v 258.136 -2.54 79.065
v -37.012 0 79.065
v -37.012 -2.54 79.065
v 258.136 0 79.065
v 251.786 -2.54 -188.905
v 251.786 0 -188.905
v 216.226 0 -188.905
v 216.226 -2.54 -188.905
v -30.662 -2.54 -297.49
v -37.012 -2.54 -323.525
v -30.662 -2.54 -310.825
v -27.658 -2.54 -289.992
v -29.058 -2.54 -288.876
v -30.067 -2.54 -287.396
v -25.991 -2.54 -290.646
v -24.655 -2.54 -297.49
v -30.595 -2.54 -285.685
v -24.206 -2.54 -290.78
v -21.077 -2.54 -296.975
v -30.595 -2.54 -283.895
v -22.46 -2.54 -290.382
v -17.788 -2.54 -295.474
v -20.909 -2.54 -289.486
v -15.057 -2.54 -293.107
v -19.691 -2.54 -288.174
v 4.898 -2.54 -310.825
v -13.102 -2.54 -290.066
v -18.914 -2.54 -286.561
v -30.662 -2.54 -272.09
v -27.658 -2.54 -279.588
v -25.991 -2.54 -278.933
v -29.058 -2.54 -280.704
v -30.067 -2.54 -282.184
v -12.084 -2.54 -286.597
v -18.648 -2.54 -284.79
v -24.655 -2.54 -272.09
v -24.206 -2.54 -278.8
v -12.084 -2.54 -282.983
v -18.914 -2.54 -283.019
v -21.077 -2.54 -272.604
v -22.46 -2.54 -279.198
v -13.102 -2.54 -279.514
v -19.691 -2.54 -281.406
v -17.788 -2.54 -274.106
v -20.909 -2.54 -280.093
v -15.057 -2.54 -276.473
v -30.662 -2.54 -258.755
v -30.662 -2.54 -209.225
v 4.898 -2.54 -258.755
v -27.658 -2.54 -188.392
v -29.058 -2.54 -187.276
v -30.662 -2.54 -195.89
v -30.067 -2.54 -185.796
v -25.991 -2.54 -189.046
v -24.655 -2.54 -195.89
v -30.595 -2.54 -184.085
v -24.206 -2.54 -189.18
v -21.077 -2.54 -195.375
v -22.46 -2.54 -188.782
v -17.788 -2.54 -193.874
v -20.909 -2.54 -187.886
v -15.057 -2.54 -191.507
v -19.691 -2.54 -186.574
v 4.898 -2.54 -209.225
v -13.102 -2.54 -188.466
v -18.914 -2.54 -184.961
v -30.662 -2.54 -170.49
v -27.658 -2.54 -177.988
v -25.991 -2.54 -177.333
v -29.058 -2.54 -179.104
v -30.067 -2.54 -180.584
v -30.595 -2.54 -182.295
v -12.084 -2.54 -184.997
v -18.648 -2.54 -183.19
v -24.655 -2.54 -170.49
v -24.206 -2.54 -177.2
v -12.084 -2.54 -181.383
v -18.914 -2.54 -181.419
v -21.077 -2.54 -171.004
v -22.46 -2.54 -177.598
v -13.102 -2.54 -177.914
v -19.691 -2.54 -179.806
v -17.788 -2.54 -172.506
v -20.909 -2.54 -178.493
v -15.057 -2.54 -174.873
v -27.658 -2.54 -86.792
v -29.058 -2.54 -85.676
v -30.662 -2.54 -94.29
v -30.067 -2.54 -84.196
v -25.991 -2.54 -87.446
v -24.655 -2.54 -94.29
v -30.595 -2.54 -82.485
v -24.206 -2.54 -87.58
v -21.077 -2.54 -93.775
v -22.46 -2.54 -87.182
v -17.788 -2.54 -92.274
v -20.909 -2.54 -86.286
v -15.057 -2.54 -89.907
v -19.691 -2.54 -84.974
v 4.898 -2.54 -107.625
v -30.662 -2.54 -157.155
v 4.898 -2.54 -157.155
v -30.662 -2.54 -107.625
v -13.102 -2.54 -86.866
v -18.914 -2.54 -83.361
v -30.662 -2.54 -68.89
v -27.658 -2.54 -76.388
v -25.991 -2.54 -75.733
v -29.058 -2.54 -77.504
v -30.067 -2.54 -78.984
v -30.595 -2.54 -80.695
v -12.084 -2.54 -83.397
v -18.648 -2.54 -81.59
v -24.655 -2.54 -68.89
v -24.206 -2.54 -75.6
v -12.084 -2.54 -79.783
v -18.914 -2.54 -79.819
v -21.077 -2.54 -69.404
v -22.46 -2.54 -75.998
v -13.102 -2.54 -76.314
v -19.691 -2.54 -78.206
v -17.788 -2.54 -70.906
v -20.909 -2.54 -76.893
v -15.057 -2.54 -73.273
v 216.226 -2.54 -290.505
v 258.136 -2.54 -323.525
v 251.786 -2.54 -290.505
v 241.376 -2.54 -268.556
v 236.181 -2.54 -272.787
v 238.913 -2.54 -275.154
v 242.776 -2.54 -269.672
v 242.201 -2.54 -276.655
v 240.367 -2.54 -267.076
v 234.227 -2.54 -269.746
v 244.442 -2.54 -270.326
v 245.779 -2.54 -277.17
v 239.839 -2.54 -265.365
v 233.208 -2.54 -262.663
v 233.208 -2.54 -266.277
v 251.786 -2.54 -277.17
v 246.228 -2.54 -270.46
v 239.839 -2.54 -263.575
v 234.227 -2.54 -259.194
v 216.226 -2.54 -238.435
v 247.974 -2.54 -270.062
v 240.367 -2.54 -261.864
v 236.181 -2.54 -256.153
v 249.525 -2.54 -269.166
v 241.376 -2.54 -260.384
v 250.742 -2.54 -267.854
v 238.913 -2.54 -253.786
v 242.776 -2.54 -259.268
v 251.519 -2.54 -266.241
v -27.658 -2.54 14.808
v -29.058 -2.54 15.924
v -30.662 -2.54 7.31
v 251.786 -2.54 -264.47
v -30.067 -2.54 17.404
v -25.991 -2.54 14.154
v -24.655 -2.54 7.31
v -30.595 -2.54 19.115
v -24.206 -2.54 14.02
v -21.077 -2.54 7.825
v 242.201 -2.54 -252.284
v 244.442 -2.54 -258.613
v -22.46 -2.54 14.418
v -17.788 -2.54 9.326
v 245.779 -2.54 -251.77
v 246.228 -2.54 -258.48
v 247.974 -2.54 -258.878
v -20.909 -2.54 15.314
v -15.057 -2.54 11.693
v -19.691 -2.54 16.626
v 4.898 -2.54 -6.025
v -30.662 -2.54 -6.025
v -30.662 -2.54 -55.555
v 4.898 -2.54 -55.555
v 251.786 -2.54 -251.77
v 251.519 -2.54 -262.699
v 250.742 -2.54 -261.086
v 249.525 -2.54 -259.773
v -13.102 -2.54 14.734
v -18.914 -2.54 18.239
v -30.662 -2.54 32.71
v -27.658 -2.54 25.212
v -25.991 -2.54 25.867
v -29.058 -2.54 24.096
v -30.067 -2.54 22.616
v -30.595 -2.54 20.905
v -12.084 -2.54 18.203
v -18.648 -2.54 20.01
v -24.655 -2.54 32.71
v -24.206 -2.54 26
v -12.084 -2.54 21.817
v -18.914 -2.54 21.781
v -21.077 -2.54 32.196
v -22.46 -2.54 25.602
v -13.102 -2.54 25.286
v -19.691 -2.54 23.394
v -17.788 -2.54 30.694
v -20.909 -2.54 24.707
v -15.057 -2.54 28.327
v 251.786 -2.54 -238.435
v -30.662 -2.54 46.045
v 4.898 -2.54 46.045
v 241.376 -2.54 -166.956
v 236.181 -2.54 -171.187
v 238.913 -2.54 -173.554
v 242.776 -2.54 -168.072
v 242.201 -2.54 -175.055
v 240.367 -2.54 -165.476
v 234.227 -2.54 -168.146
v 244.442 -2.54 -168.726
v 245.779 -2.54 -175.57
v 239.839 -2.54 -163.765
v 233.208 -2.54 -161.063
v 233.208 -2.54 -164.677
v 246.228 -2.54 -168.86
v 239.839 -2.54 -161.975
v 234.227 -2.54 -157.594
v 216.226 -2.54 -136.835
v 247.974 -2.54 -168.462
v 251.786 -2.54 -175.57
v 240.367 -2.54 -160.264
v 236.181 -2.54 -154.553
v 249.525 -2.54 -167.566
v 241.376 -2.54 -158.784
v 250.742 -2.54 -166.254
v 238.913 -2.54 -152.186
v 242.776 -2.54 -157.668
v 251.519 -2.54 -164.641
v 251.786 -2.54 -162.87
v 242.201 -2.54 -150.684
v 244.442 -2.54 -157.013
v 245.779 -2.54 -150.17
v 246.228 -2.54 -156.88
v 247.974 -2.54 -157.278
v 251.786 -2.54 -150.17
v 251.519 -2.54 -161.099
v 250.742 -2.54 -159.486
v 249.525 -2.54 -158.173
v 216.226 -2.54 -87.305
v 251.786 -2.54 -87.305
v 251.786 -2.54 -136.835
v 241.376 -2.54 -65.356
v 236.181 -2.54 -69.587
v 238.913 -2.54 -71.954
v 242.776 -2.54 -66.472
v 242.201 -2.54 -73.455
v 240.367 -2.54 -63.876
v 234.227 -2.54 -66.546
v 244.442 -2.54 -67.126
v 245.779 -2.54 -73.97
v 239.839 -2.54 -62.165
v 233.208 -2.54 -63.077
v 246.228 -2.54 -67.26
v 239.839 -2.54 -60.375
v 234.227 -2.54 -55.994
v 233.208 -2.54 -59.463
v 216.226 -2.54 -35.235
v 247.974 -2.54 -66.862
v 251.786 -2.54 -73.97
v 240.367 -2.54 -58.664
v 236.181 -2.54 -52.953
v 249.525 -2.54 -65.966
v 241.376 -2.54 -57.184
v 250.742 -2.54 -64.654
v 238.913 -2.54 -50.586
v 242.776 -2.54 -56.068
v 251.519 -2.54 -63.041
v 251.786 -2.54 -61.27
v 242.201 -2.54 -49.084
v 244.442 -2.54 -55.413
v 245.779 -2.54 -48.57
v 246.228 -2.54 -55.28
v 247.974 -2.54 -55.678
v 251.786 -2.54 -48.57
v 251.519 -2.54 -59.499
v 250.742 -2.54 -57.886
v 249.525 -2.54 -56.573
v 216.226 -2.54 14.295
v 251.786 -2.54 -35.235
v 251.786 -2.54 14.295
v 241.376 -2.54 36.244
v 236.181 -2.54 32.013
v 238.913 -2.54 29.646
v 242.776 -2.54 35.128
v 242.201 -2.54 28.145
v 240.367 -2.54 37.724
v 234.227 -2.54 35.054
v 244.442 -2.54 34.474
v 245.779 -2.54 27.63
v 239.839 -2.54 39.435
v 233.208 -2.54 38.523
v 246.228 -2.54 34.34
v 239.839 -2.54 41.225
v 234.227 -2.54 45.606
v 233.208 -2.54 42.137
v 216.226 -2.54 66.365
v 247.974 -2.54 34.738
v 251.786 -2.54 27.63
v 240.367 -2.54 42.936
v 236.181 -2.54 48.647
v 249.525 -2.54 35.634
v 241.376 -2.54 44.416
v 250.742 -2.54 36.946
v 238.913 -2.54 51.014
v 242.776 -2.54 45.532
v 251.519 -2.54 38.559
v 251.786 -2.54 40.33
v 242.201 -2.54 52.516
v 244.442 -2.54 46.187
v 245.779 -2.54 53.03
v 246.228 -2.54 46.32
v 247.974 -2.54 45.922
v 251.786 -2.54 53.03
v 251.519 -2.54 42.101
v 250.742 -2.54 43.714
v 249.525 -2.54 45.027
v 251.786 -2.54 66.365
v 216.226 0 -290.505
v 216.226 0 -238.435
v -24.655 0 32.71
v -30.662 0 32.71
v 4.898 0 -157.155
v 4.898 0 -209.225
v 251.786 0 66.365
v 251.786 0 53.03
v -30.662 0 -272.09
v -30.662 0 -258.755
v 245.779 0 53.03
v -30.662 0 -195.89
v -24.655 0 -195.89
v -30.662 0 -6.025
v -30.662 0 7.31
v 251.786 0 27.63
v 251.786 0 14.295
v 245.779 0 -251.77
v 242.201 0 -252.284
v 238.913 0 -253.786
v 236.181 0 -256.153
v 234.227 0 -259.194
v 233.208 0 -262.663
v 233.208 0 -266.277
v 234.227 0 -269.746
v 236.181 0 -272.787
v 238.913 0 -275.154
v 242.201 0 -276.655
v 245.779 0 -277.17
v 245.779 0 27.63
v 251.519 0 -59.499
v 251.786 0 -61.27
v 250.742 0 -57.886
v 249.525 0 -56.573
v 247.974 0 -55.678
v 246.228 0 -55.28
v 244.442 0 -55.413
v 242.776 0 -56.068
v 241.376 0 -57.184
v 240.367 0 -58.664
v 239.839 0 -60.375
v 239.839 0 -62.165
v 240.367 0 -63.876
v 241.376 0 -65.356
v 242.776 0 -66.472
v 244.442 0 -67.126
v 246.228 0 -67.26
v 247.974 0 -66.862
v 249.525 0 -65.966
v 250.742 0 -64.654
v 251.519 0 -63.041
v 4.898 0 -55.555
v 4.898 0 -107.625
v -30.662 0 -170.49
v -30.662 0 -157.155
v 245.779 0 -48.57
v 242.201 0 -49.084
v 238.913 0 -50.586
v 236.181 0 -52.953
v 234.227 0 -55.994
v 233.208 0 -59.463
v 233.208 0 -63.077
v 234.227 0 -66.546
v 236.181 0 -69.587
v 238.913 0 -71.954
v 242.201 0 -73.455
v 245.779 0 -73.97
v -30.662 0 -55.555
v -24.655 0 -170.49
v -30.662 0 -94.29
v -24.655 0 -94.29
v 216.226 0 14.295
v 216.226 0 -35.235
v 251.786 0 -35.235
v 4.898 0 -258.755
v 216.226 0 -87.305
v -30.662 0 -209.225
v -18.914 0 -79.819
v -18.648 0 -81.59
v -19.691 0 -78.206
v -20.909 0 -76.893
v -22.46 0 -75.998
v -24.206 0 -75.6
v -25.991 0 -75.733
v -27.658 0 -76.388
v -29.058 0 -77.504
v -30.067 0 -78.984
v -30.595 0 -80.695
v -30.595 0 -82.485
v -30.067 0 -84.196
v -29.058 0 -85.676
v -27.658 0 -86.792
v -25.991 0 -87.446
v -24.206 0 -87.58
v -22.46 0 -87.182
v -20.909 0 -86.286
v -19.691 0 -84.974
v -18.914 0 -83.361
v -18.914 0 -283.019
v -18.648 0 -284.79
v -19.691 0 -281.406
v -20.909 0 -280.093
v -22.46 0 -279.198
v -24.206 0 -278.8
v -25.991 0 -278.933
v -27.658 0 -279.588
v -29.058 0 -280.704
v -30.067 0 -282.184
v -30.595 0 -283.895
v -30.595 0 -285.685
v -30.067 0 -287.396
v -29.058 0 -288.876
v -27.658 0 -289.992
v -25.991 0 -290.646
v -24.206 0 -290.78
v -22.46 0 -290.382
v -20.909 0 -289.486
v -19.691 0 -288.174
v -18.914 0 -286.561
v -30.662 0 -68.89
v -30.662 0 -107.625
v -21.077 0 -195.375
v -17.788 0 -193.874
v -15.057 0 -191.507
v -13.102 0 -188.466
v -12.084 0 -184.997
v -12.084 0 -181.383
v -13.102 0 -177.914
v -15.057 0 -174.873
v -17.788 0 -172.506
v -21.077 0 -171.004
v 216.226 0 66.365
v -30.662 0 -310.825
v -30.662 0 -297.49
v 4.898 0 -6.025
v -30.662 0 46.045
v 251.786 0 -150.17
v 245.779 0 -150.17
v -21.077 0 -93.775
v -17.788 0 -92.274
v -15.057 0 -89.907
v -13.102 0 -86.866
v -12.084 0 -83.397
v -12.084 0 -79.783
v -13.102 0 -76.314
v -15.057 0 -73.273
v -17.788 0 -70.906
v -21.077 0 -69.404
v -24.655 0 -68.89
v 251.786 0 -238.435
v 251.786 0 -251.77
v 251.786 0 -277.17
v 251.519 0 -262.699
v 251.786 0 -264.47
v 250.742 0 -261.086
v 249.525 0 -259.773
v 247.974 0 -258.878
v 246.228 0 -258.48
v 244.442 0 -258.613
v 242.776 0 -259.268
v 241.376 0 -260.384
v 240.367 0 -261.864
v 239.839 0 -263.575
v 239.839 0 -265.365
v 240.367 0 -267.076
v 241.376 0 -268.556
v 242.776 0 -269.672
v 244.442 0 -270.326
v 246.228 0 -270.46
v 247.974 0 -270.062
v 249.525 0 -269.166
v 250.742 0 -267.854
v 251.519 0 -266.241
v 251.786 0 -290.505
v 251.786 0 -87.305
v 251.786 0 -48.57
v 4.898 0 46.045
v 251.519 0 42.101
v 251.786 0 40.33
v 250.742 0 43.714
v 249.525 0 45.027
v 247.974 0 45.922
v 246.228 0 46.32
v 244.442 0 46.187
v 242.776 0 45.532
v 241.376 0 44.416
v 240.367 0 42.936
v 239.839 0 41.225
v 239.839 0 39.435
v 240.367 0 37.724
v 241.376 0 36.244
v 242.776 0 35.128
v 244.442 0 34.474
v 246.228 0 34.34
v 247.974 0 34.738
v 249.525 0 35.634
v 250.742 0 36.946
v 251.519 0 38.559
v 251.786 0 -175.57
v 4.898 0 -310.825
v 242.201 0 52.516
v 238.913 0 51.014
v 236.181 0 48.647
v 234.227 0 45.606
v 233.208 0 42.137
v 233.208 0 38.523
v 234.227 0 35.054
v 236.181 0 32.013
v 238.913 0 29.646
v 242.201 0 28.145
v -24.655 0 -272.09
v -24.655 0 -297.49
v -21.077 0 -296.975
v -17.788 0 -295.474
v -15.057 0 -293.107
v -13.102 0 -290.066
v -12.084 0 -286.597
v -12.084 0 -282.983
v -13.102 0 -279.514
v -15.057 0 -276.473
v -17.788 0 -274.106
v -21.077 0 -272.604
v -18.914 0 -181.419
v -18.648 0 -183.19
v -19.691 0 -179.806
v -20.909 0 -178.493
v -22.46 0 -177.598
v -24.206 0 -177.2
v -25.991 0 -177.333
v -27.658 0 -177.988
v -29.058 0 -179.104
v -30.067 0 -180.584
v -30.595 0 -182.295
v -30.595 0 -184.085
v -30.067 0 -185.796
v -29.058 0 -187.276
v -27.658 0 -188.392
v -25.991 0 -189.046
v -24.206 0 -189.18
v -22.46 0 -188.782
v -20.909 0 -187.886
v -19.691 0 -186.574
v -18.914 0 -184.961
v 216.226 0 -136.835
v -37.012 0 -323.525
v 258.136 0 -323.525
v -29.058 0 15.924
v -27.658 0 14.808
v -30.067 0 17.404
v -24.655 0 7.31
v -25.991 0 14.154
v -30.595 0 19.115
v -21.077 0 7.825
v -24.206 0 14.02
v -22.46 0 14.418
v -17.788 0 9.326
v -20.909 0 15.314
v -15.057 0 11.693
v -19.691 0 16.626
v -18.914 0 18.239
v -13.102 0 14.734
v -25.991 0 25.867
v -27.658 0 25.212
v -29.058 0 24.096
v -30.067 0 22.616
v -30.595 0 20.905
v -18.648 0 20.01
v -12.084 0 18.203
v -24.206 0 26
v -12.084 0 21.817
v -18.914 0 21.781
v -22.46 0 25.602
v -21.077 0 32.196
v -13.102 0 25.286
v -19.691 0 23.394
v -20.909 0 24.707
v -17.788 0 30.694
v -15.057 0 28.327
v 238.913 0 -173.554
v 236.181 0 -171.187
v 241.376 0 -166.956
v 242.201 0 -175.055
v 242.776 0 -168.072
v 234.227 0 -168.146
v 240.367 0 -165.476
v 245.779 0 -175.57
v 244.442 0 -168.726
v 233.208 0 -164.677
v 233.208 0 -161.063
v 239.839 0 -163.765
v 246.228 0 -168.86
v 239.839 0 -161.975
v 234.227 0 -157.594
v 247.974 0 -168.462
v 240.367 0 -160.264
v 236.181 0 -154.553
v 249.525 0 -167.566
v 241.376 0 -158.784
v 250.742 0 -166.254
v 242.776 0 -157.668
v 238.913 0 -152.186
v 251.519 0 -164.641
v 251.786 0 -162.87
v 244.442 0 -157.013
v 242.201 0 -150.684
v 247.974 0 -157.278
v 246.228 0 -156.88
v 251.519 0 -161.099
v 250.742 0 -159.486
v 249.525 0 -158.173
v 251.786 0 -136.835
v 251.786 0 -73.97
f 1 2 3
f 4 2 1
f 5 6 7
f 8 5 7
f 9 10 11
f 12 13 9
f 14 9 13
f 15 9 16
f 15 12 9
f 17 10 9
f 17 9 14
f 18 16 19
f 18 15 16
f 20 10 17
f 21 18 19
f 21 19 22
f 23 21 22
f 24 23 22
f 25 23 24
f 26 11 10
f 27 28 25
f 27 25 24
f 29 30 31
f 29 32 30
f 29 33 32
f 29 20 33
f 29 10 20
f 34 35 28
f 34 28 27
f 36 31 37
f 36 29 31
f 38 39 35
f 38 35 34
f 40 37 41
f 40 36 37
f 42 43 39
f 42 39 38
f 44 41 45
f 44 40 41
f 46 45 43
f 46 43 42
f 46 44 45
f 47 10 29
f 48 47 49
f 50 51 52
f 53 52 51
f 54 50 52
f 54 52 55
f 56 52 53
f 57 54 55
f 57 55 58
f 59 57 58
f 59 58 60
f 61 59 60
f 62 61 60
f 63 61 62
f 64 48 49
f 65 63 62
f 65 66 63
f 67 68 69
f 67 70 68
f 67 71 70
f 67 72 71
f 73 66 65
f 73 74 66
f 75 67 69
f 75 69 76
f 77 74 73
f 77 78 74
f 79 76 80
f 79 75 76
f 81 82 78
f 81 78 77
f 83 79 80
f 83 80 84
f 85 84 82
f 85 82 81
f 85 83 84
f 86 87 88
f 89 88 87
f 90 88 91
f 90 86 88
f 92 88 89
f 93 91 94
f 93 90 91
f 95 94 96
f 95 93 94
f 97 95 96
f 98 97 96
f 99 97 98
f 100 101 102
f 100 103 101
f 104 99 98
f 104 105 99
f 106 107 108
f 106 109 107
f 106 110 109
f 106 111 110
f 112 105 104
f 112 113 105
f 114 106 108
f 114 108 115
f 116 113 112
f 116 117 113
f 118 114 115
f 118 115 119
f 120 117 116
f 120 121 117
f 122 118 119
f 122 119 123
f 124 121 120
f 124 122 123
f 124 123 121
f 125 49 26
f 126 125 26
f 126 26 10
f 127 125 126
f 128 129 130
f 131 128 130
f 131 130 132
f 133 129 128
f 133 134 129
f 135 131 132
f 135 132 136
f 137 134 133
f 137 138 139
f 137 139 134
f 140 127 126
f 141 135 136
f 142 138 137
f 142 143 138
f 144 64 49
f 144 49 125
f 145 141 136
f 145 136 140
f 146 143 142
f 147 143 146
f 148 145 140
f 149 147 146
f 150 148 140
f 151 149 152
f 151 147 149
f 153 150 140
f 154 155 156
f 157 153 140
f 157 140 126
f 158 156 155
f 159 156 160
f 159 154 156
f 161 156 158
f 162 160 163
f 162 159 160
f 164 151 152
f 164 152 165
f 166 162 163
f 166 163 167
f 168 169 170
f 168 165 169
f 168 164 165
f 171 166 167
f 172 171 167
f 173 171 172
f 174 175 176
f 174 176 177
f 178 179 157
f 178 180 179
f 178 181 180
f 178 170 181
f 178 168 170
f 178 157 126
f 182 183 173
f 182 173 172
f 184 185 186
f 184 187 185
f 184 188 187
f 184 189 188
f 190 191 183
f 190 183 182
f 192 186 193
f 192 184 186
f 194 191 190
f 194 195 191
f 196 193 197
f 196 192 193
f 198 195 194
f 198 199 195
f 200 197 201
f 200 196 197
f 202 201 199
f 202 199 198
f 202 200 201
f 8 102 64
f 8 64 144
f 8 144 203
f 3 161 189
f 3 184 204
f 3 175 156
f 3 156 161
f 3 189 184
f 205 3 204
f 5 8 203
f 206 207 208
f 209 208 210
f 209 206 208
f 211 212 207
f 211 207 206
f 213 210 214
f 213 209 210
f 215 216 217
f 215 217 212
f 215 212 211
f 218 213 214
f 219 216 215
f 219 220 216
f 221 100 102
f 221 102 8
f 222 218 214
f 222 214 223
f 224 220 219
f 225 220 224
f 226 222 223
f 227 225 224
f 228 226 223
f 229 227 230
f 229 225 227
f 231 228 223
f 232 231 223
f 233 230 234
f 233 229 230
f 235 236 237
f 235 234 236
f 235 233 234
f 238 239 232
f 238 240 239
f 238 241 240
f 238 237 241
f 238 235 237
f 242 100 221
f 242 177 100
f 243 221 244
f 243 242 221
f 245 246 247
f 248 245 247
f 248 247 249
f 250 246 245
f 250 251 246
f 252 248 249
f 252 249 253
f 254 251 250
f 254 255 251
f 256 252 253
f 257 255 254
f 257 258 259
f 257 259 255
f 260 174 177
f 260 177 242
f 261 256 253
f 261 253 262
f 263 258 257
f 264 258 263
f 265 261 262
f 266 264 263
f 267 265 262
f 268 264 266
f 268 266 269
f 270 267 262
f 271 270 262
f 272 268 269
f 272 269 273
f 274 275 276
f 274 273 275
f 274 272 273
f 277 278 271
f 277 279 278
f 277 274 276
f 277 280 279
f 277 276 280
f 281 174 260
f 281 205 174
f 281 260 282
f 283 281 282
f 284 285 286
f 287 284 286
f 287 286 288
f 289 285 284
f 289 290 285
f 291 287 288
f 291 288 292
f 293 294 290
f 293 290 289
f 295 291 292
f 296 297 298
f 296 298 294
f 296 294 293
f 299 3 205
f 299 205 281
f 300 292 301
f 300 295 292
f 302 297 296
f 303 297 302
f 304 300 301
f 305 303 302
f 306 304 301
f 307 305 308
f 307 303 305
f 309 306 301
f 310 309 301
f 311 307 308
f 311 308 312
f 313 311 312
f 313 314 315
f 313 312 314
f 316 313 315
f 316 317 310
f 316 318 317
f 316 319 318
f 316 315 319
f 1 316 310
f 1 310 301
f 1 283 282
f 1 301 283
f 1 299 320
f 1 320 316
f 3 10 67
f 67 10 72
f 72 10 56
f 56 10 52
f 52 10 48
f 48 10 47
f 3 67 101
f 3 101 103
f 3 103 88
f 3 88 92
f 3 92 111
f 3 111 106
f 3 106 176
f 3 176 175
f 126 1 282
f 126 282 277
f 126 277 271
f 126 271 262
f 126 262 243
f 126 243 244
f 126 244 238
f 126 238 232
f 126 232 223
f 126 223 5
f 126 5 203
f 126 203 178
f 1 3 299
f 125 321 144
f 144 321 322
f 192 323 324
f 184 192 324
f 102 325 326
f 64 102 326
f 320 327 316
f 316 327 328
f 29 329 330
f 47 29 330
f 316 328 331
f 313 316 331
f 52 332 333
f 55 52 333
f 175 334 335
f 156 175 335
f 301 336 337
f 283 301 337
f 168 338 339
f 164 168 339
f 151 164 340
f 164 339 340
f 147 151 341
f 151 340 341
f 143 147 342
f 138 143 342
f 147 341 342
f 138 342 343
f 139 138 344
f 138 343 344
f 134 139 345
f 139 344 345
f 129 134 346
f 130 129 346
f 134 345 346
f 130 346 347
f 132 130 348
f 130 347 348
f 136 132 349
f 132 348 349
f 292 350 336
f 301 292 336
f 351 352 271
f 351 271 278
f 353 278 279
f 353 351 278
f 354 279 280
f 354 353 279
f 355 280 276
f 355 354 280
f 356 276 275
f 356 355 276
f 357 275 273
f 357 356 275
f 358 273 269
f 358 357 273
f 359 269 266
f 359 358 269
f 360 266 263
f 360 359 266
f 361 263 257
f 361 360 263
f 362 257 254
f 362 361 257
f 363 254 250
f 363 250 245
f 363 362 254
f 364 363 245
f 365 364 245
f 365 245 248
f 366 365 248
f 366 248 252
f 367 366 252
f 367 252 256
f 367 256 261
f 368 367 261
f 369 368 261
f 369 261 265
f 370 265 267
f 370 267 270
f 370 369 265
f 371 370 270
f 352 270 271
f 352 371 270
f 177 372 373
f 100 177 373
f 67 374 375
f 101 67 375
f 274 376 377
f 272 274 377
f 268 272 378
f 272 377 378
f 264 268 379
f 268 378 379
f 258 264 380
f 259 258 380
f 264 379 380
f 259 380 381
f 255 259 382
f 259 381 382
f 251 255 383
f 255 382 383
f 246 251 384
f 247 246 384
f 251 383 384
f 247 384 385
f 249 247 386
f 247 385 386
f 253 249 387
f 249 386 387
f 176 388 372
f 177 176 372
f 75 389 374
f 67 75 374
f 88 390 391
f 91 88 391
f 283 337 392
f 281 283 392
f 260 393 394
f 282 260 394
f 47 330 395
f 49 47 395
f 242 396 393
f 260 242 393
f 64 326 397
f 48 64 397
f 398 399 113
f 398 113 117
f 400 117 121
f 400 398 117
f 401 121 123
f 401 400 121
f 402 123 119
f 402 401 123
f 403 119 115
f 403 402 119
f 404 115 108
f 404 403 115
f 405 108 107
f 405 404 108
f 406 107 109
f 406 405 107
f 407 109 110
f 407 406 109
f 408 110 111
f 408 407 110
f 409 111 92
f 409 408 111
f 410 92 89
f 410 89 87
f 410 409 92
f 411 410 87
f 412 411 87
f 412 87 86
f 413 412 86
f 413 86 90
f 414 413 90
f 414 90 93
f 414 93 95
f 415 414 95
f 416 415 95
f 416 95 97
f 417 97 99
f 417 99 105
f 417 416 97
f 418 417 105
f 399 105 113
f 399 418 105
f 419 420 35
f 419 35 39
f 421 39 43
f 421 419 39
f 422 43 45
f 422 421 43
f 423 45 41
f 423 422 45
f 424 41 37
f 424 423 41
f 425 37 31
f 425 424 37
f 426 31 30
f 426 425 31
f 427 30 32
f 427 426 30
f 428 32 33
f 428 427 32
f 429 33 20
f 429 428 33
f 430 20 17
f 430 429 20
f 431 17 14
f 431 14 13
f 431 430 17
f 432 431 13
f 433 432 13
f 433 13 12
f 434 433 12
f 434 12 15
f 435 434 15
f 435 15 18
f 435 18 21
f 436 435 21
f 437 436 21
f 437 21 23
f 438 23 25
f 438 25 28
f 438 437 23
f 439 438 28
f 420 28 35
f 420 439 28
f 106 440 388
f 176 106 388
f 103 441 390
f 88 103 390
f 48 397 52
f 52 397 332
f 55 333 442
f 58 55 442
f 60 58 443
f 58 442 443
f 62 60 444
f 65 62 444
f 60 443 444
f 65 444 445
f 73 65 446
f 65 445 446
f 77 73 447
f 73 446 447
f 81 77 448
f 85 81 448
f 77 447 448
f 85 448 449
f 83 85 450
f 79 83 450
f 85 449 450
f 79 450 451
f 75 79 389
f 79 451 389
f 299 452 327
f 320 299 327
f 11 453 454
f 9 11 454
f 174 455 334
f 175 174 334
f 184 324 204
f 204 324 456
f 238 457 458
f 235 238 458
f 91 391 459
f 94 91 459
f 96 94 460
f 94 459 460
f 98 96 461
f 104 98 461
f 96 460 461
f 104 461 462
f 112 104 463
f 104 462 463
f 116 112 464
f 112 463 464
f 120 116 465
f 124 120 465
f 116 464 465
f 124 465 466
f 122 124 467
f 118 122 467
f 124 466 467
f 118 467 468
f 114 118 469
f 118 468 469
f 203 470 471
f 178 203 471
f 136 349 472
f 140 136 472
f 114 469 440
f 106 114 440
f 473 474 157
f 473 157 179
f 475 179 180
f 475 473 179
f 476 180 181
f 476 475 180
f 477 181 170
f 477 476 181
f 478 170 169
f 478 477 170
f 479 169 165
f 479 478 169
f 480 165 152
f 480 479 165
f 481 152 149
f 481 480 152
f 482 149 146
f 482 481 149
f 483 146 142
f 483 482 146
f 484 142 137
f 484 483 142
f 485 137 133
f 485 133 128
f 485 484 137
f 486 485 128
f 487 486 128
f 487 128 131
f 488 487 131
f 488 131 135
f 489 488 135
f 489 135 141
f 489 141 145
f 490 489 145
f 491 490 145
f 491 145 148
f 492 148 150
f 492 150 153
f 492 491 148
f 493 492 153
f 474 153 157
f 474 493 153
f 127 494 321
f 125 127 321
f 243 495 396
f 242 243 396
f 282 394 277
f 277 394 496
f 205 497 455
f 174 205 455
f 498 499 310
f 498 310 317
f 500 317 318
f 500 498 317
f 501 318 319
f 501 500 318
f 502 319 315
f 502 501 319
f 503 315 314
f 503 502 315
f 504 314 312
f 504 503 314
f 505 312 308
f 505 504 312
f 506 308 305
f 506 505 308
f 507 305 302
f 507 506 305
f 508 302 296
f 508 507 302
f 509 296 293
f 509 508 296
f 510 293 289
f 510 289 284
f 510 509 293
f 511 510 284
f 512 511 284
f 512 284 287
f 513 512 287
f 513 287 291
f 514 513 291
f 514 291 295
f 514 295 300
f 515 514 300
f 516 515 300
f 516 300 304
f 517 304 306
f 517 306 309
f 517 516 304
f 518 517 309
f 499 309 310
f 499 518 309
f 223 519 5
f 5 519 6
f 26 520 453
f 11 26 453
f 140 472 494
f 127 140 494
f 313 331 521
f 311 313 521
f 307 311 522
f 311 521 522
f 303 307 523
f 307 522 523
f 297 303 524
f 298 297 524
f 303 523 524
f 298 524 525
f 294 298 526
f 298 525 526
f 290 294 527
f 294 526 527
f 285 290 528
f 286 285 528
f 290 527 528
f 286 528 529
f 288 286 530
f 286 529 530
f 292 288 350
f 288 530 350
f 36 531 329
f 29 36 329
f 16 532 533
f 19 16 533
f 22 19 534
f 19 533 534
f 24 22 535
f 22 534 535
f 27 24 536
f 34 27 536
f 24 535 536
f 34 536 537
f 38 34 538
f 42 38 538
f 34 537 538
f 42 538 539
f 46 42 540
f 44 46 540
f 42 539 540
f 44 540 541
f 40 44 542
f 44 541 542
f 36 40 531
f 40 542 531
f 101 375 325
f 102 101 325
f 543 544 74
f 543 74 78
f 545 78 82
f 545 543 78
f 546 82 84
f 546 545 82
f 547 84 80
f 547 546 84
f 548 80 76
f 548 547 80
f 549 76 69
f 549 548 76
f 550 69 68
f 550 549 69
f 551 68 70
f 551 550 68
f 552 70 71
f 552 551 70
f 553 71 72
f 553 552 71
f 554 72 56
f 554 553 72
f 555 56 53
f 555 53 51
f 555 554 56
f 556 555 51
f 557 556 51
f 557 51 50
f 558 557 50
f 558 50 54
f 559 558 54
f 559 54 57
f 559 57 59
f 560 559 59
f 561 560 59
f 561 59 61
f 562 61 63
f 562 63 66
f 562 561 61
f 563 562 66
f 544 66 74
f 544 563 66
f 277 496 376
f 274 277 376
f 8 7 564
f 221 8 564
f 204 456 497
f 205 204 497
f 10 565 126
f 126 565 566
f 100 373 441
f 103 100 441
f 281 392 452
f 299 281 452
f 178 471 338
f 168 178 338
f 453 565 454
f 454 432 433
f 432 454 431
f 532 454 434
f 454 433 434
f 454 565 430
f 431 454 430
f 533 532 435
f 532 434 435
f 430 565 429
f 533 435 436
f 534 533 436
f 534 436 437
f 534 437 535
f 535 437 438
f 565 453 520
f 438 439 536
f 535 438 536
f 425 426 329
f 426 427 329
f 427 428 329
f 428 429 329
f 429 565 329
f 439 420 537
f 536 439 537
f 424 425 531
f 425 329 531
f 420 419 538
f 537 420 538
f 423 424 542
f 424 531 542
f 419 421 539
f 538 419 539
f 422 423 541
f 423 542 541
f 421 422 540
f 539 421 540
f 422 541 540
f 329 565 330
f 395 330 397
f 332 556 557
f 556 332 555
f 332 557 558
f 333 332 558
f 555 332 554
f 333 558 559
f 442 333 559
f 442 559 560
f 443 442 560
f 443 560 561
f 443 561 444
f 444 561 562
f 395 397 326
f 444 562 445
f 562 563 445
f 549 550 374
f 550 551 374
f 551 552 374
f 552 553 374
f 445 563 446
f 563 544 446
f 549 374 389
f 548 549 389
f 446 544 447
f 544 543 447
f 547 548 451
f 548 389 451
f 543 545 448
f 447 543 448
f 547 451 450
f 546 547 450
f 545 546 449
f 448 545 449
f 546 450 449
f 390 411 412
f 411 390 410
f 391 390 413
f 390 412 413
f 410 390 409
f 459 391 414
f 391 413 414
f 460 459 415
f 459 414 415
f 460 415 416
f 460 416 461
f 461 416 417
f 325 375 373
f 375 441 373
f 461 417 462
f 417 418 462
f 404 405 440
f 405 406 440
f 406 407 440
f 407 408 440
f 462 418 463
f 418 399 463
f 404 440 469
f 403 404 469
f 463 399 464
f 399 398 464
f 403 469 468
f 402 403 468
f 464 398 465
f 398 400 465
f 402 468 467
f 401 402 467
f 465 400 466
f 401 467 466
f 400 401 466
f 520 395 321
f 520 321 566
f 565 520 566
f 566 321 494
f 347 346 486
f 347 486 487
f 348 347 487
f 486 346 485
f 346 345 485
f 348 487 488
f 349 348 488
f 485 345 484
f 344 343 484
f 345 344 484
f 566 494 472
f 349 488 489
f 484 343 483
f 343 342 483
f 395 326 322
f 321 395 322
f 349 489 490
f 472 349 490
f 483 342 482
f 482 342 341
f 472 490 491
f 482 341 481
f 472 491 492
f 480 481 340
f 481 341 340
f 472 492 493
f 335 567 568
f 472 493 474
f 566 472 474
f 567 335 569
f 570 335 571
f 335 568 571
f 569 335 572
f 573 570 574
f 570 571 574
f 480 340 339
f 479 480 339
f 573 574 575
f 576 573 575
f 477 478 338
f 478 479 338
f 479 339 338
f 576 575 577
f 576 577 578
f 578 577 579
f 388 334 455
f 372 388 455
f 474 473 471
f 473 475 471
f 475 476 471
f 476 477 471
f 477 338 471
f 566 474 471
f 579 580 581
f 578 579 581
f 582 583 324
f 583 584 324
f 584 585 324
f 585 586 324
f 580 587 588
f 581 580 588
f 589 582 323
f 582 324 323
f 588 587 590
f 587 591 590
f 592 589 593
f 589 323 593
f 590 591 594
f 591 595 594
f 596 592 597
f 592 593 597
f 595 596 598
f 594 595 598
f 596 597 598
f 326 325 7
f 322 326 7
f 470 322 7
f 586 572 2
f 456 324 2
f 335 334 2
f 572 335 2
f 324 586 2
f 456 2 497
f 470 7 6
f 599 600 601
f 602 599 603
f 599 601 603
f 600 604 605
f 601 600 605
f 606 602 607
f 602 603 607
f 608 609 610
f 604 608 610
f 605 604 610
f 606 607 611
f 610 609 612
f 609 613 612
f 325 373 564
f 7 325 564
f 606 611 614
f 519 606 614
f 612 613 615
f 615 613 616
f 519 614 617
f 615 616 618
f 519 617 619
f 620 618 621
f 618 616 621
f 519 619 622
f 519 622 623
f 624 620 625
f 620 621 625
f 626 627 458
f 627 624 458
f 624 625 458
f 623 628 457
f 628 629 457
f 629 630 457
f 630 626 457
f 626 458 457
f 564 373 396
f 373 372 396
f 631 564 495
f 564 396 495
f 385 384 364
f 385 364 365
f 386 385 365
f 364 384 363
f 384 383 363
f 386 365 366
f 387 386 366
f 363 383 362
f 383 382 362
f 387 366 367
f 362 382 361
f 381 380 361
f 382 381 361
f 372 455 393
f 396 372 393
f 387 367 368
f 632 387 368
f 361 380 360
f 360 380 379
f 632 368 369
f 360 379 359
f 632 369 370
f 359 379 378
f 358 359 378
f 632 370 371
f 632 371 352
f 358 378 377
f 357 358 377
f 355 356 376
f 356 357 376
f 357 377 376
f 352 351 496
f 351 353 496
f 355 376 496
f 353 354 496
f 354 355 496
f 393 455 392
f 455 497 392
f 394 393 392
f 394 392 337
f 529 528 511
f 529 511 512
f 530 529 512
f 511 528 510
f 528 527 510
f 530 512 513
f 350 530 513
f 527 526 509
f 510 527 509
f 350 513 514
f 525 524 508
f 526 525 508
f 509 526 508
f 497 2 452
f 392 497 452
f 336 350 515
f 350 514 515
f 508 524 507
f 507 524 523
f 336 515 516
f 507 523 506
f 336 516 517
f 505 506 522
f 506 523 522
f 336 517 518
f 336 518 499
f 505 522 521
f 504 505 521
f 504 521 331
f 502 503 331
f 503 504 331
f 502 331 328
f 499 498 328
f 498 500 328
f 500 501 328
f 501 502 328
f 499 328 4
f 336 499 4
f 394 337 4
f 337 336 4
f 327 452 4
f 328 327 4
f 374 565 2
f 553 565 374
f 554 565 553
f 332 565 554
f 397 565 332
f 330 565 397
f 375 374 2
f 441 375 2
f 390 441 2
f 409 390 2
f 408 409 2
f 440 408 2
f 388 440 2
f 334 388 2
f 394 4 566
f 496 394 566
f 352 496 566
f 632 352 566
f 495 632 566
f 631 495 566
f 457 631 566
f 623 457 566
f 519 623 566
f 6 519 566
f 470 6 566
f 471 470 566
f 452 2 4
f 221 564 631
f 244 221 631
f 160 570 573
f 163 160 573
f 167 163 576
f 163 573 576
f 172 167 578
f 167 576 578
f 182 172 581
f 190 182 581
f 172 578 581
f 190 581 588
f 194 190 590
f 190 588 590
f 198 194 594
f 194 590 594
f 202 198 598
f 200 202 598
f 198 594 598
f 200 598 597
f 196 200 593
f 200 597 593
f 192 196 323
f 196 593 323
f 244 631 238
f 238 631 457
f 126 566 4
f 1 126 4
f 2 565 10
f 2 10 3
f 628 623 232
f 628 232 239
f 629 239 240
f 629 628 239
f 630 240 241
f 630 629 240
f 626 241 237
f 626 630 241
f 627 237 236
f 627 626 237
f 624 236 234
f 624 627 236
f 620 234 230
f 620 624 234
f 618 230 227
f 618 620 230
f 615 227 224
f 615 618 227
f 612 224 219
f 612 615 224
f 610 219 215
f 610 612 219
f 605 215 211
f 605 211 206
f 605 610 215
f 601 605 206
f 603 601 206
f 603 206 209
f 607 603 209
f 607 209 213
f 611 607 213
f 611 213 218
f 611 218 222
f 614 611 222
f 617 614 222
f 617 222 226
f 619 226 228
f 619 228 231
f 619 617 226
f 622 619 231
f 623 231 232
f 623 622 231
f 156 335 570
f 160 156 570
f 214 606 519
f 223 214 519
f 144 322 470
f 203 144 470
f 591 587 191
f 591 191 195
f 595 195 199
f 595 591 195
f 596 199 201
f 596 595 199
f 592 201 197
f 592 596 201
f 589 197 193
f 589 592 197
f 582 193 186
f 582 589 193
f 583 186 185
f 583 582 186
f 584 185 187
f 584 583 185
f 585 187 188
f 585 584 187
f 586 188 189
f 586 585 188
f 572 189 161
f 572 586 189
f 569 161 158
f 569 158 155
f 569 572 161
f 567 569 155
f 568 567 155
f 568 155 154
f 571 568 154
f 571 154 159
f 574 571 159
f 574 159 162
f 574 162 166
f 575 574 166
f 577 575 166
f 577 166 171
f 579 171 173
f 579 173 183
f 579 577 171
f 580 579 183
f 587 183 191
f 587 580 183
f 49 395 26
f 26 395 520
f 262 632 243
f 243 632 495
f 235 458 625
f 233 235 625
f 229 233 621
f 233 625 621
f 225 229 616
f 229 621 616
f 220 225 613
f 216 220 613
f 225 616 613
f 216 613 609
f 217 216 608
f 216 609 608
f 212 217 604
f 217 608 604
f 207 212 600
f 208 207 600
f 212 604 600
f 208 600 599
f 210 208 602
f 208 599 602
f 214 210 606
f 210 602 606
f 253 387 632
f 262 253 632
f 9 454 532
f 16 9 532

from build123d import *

# Parameters (mm, degrees)
F0_W     = 295.148
F0_H     = 402.59
F0_R     = 6.0071
F1_DEPTH = 2.54


with BuildPart() as f1:
    # F0 (on Front) → F1 (new body)
    with BuildSketch(Plane.XZ):
        with Locations((110.562274, -122.229906)):
            Rectangle(F0_W, F0_H)
        with Locations((-24.654626, -284.789906)):
            Circle(F0_R, mode=Mode.SUBTRACT)
        with BuildLine():
            Line((-30.661726, -258.754906), (4.898274, -258.754906))
            Line((4.898274, -258.754906), (4.898274, -310.824906))
            Line((4.898274, -310.824906), (-30.661726, -310.824906))
            Line((-30.661726, -310.824906), (-30.661726, -297.489906))
            Line((-30.661726, -297.489906), (-24.654626, -297.489906))
            ThreePointArc((-24.654626, -297.489906), (-11.954626, -284.789906), (-24.654626, -272.089906))
            Line((-24.654626, -272.089906), (-30.661726, -272.089906))
            Line((-30.661726, -272.089906), (-30.661726, -258.754906))
        make_face(mode=Mode.SUBTRACT)
        with Locations((-24.654626, -183.189906)):
            Circle(F0_R, mode=Mode.SUBTRACT)
        with BuildLine():
            Line((-30.661726, -157.154906), (4.898274, -157.154906))
            Line((4.898274, -157.154906), (4.898274, -209.224906))
            Line((4.898274, -209.224906), (-30.661726, -209.224906))
            Line((-30.661726, -209.224906), (-30.661726, -195.889906))
            Line((-30.661726, -195.889906), (-24.654626, -195.889906))
            ThreePointArc((-24.654626, -195.889906), (-11.954626, -183.189906), (-24.654626, -170.489906))
            Line((-24.654626, -170.489906), (-30.661726, -170.489906))
            Line((-30.661726, -170.489906), (-30.661726, -157.154906))
        make_face(mode=Mode.SUBTRACT)
        with BuildLine():
            Line((251.786274, -290.504906), (216.226274, -290.504906))
            Line((216.226274, -290.504906), (216.226274, -238.434906))
            Line((216.226274, -238.434906), (251.786274, -238.434906))
            Line((251.786274, -238.434906), (251.786274, -251.769906))
            Line((251.786274, -251.769906), (245.779174, -251.769906))
            ThreePointArc((245.779174, -251.769906), (233.079174, -264.469906), (245.779174, -277.169906))
            Line((245.779174, -277.169906), (251.786274, -277.169906))
            Line((251.786274, -277.169906), (251.786274, -290.504906))
        make_face(mode=Mode.SUBTRACT)
        with Locations((245.779174, -264.469906)):
            Circle(F0_R, mode=Mode.SUBTRACT)
        with BuildLine():
            Line((251.786274, -150.169906), (245.779174, -150.169906))
            ThreePointArc((245.779174, -150.169906), (233.079174, -162.869906), (245.779174, -175.569906))
            Line((245.779174, -175.569906), (251.786274, -175.569906))
            Line((251.786274, -175.569906), (251.786274, -188.904906))
            Line((251.786274, -188.904906), (216.226274, -188.904906))
            Line((216.226274, -188.904906), (216.226274, -136.834906))
            Line((216.226274, -136.834906), (251.786274, -136.834906))
            Line((251.786274, -136.834906), (251.786274, -150.169906))
        make_face(mode=Mode.SUBTRACT)
        with Locations((245.779174, -162.869906)):
            Circle(F0_R, mode=Mode.SUBTRACT)
        with Locations((-24.654626, -81.589906)):
            Circle(F0_R, mode=Mode.SUBTRACT)
        with BuildLine():
            Line((-30.661726, -55.554906), (4.898274, -55.554906))
            Line((4.898274, -55.554906), (4.898274, -107.624906))
            Line((4.898274, -107.624906), (-30.661726, -107.624906))
            Line((-30.661726, -107.624906), (-30.661726, -94.289906))
            Line((-30.661726, -94.289906), (-24.654626, -94.289906))
            ThreePointArc((-24.654626, -94.289906), (-11.954626, -81.589906), (-24.654626, -68.889906))
            Line((-24.654626, -68.889906), (-30.661726, -68.889906))
            Line((-30.661726, -68.889906), (-30.661726, -55.554906))
        make_face(mode=Mode.SUBTRACT)
        with Locations((-24.654626, 20.010094)):
            Circle(F0_R, mode=Mode.SUBTRACT)
        with BuildLine():
            Line((-30.661726, 32.710094), (-30.661726, 46.045094))
            Line((-30.661726, 46.045094), (4.898274, 46.045094))
            Line((4.898274, 46.045094), (4.898274, -6.024906))
            Line((4.898274, -6.024906), (-30.661726, -6.024906))
            Line((-30.661726, -6.024906), (-30.661726, 7.310094))
            Line((-30.661726, 7.310094), (-24.654626, 7.310094))
            ThreePointArc((-24.654626, 7.310094), (-11.954626, 20.010094), (-24.654626, 32.710094))
            Line((-24.654626, 32.710094), (-30.661726, 32.710094))
        make_face(mode=Mode.SUBTRACT)
        with BuildLine():
            Line((216.226274, -35.234906), (251.786274, -35.234906))
            Line((251.786274, -35.234906), (251.786274, -48.569906))
            Line((251.786274, -48.569906), (245.779174, -48.569906))
            ThreePointArc((245.779174, -48.569906), (233.079174, -61.269906), (245.779174, -73.969906))
            Line((245.779174, -73.969906), (251.786274, -73.969906))
            Line((251.786274, -73.969906), (251.786274, -87.304906))
            Line((251.786274, -87.304906), (216.226274, -87.304906))
            Line((216.226274, -87.304906), (216.226274, -35.234906))
        make_face(mode=Mode.SUBTRACT)
        with Locations((245.779174, -61.269906)):
            Circle(F0_R, mode=Mode.SUBTRACT)
        with BuildLine():
            Line((251.786274, 27.630094), (251.786274, 14.295094))
            Line((251.786274, 14.295094), (216.226274, 14.295094))
            Line((216.226274, 14.295094), (216.226274, 66.365094))
            Line((216.226274, 66.365094), (251.786274, 66.365094))
            Line((251.786274, 66.365094), (251.786274, 53.030094))
            Line((251.786274, 53.030094), (245.779174, 53.030094))
            ThreePointArc((245.779174, 53.030094), (233.079174, 40.330094), (245.779174, 27.630094))
            Line((245.779174, 27.630094), (251.786274, 27.630094))
        make_face(mode=Mode.SUBTRACT)
        with Locations((245.779174, 40.330094)):
            Circle(F0_R, mode=Mode.SUBTRACT)
    extrude(amount=F1_DEPTH)


solid = f1.part
